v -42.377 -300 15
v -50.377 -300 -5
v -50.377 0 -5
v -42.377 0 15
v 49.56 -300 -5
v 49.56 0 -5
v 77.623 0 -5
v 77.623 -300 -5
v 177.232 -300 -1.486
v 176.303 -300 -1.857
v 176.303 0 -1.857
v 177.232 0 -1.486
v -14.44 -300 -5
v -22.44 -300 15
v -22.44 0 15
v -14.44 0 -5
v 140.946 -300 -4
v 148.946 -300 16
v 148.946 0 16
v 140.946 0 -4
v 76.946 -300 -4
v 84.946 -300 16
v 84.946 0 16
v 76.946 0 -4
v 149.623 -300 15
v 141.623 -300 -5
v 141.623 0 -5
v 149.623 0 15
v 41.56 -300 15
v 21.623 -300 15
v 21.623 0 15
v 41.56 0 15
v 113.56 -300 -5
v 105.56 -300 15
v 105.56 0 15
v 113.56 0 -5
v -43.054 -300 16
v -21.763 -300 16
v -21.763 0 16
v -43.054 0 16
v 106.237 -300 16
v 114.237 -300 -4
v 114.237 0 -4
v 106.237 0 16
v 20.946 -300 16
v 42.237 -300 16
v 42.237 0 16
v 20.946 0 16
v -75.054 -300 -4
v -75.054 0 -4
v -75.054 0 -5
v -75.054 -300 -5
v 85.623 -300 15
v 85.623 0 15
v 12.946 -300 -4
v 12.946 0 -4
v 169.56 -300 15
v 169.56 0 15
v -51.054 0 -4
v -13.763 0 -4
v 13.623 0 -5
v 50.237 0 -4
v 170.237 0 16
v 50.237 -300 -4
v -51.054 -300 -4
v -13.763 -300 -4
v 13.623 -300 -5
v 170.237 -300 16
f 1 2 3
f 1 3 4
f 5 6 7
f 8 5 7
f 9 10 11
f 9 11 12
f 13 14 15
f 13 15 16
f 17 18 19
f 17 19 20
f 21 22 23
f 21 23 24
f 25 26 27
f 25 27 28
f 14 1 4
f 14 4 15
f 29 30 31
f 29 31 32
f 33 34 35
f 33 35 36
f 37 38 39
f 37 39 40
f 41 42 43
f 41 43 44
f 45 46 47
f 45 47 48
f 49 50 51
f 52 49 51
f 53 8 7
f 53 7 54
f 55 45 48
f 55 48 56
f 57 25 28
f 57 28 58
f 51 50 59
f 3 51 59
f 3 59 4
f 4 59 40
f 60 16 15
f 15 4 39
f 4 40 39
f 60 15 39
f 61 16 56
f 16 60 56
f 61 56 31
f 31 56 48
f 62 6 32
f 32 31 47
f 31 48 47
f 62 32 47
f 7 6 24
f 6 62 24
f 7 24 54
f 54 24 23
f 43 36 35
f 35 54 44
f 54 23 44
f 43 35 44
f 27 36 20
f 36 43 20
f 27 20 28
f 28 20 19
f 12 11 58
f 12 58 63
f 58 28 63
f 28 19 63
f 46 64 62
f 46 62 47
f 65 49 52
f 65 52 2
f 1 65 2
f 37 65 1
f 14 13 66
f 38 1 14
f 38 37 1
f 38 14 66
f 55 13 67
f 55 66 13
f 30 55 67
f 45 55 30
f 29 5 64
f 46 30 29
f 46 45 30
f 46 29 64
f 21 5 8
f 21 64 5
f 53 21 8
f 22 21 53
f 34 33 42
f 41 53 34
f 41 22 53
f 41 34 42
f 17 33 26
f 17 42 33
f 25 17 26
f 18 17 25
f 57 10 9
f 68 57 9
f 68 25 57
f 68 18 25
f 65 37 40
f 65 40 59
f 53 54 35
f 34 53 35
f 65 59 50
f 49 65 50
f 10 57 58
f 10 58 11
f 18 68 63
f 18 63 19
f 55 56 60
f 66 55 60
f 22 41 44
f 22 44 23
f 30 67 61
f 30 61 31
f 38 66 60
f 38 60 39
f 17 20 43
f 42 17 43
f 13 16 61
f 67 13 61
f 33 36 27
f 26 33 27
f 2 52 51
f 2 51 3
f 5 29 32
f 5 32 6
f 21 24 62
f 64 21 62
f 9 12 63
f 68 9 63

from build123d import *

# Parameters (mm, degrees)
F1_DEPTH = 300


with BuildPart() as f1:
    # F0 (on Front) → F1 (new body)
    with BuildSketch(Plane.XZ):
        Polygon((-51.054478, -4), (-75.054478, -4), (-75.054478, -5), (-50.377445, -5), (-42.377445, 15), (-22.439643, 15), (-14.439643, -5), (13.622555, -5), (21.622555, 15), (41.560357, 15), (49.560357, -5), (77.622555, -5), (85.622555, 15), (105.560357, 15), (113.560357, -5), (141.622555, -5), (149.622555, 15), (169.560357, 15), (176.303139, -1.856953), (177.231616, -1.485563), (170.23739, 16), (148.945522, 16), (140.945522, -4), (114.23739, -4), (106.23739, 16), (84.945522, 16), (76.945522, -4), (50.23739, -4), (42.23739, 16), (20.945522, 16), (12.945522, -4), (-13.76261, -4), (-21.76261, 16), (-43.054478, 16), align=None)
    extrude(amount=F1_DEPTH)


solid = f1.part
